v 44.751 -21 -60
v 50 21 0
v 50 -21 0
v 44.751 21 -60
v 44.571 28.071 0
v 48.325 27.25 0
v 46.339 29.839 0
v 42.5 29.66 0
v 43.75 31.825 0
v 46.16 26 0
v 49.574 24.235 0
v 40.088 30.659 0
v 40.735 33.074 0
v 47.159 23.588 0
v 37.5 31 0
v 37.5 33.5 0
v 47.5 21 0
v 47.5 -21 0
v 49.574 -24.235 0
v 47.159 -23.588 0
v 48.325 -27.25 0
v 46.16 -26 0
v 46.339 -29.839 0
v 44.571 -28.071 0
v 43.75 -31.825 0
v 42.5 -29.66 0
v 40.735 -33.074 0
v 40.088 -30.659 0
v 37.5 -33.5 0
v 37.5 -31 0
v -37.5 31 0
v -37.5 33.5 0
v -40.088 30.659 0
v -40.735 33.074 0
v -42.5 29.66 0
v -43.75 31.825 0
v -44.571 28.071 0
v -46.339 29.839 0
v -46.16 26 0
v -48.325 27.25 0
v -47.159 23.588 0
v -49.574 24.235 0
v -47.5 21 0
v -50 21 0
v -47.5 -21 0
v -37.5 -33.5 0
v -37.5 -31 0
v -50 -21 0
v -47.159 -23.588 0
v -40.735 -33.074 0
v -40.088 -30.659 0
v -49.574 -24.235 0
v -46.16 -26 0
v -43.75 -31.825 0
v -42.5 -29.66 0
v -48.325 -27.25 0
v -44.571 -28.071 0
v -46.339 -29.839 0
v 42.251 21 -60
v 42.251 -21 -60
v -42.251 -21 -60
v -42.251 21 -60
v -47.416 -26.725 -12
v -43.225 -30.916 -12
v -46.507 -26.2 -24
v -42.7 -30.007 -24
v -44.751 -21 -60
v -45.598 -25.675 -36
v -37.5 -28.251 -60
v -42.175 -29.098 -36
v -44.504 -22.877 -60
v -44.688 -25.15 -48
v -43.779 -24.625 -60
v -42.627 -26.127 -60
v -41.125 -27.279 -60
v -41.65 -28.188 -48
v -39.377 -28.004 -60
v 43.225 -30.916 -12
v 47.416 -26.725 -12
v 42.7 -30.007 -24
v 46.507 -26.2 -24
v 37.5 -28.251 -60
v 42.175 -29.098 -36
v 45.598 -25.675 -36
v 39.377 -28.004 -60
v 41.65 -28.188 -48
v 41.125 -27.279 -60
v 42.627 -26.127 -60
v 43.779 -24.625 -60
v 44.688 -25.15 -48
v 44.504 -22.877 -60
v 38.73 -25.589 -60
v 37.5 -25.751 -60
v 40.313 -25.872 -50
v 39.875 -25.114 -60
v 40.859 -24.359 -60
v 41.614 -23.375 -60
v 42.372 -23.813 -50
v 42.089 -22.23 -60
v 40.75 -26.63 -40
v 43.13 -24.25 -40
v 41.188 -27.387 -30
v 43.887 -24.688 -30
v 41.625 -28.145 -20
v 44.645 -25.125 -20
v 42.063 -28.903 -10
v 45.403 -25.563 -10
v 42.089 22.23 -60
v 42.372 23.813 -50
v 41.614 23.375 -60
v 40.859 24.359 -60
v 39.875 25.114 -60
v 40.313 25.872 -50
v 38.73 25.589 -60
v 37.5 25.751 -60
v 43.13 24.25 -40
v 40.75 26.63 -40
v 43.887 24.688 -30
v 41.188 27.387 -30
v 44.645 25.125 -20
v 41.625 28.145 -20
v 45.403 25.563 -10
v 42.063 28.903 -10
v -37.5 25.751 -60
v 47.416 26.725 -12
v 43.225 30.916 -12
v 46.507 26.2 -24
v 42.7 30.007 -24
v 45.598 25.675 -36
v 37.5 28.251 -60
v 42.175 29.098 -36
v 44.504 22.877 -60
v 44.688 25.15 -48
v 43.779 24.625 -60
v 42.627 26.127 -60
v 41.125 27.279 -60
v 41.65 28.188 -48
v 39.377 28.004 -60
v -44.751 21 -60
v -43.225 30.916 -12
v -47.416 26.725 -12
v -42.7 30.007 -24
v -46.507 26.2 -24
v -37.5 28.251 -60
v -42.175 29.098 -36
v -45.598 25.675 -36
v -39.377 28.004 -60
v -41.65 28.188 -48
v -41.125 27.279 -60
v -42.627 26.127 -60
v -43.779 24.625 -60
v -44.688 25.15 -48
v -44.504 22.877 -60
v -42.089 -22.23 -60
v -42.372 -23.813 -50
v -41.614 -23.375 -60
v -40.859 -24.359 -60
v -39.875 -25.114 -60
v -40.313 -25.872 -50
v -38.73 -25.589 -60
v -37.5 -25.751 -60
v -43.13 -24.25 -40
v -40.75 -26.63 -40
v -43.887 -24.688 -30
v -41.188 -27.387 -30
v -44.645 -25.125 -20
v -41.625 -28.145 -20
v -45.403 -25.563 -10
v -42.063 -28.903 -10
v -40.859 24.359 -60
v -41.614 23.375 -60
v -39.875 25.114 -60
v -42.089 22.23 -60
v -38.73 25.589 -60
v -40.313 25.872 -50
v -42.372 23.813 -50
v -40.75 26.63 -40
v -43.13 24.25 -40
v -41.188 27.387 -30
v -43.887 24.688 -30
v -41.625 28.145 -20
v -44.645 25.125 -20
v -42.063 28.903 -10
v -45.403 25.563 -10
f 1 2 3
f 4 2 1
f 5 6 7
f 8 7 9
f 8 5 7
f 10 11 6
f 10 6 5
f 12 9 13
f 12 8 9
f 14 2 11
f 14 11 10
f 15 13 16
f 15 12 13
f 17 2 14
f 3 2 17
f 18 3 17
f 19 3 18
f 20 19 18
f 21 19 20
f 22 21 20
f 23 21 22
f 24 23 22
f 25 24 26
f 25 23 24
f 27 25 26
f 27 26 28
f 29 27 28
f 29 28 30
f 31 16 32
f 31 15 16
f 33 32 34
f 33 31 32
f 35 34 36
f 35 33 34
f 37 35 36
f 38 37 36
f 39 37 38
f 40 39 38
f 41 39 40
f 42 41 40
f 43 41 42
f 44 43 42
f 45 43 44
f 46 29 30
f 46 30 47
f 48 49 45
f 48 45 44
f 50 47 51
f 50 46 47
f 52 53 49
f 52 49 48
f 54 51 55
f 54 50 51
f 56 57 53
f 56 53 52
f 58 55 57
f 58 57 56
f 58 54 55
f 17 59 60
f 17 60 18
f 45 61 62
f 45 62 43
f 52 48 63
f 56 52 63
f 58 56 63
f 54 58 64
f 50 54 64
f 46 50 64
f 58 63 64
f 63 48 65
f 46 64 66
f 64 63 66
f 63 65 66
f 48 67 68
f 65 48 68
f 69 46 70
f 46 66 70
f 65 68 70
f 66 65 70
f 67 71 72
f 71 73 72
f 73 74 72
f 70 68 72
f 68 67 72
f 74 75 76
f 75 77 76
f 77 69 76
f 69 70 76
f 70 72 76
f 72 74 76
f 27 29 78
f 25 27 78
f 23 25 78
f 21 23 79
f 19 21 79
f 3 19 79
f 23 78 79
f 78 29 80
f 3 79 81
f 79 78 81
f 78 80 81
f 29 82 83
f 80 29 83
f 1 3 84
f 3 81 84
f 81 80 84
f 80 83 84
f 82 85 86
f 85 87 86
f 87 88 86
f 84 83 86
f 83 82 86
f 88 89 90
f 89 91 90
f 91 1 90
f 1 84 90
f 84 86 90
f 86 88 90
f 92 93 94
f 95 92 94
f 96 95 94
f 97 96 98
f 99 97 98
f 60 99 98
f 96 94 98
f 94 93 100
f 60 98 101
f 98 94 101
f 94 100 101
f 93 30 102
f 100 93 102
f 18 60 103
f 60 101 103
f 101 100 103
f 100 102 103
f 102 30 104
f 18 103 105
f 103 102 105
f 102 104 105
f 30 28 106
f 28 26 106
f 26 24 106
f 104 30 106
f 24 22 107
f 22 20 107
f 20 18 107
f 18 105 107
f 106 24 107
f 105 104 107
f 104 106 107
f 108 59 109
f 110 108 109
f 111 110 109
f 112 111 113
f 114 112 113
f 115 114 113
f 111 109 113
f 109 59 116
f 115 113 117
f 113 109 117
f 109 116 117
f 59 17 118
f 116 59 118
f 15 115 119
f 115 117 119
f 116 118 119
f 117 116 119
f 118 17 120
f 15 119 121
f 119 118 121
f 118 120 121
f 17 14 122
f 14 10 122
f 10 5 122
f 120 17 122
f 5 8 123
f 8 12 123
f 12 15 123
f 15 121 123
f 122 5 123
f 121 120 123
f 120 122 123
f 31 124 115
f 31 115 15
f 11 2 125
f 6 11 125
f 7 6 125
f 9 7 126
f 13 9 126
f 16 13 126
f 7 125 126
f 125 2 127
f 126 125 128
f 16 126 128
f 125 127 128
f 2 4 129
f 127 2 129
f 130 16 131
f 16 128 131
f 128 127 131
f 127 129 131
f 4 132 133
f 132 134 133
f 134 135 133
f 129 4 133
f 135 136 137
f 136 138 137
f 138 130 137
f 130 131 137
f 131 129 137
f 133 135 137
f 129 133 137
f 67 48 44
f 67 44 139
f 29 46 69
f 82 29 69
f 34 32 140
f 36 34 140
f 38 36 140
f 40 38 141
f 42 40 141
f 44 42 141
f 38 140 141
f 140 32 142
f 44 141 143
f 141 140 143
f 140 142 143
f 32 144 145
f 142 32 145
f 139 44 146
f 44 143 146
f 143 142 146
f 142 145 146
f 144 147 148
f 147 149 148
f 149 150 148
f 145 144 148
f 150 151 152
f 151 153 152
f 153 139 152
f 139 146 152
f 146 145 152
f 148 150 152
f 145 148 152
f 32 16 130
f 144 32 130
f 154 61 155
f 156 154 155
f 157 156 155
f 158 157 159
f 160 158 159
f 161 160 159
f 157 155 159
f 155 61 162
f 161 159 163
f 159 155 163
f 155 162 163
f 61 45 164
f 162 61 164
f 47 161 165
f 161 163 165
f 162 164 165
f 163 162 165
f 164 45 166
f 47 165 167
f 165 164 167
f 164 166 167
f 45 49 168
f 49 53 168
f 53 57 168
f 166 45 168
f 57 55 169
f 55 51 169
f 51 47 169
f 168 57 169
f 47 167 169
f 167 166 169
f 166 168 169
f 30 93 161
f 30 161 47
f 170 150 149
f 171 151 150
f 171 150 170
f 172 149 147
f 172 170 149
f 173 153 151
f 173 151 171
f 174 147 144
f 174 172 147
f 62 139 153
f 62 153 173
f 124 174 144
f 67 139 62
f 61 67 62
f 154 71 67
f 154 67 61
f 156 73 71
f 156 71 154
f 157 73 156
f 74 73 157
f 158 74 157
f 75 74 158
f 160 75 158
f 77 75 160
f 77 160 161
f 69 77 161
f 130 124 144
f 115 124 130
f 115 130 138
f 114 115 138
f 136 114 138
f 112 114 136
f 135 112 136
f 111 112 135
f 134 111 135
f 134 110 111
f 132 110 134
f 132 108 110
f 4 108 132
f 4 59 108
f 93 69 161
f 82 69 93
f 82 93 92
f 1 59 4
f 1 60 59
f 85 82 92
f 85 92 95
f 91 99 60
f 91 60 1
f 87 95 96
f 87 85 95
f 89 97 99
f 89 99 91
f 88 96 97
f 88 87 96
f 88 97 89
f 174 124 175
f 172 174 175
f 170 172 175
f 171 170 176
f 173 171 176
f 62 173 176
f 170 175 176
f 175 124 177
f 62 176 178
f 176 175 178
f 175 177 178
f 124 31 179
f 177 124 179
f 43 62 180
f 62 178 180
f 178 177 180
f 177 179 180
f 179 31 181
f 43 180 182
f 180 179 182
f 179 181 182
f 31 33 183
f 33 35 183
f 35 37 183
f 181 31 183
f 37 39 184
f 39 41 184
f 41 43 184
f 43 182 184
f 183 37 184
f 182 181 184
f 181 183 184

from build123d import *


with BuildPart() as f2:
    # F2: sweep along a path in F0
    with BuildLine(Plane.XY) as f2_path:
        Line((-47.5, 21), (-47.5, -21))
        ThreePointArc((-47.5, -21), (-44.571068, -28.071068), (-37.5, -31))
        Line((-37.5, -31), (37.5, -31))
        ThreePointArc((37.5, -31), (44.571068, -28.071068), (47.5, -21))
        Line((47.5, -21), (47.5, 21))
        ThreePointArc((47.5, 21), (44.571068, 28.071068), (37.5, 31))
        Line((37.5, 31), (-37.5, 31))
        ThreePointArc((-37.5, 31), (-44.571068, 28.071068), (-47.5, 21))
    # F1 (on Front) → F2 (sweep)
    with BuildSketch(Plane.XZ):
        Polygon((-44.75068, -60), (-42.25068, -60), (-47.5, 0), (-50, 0), align=None)
    sweep(path=f2_path.line)


solid = f2.part
